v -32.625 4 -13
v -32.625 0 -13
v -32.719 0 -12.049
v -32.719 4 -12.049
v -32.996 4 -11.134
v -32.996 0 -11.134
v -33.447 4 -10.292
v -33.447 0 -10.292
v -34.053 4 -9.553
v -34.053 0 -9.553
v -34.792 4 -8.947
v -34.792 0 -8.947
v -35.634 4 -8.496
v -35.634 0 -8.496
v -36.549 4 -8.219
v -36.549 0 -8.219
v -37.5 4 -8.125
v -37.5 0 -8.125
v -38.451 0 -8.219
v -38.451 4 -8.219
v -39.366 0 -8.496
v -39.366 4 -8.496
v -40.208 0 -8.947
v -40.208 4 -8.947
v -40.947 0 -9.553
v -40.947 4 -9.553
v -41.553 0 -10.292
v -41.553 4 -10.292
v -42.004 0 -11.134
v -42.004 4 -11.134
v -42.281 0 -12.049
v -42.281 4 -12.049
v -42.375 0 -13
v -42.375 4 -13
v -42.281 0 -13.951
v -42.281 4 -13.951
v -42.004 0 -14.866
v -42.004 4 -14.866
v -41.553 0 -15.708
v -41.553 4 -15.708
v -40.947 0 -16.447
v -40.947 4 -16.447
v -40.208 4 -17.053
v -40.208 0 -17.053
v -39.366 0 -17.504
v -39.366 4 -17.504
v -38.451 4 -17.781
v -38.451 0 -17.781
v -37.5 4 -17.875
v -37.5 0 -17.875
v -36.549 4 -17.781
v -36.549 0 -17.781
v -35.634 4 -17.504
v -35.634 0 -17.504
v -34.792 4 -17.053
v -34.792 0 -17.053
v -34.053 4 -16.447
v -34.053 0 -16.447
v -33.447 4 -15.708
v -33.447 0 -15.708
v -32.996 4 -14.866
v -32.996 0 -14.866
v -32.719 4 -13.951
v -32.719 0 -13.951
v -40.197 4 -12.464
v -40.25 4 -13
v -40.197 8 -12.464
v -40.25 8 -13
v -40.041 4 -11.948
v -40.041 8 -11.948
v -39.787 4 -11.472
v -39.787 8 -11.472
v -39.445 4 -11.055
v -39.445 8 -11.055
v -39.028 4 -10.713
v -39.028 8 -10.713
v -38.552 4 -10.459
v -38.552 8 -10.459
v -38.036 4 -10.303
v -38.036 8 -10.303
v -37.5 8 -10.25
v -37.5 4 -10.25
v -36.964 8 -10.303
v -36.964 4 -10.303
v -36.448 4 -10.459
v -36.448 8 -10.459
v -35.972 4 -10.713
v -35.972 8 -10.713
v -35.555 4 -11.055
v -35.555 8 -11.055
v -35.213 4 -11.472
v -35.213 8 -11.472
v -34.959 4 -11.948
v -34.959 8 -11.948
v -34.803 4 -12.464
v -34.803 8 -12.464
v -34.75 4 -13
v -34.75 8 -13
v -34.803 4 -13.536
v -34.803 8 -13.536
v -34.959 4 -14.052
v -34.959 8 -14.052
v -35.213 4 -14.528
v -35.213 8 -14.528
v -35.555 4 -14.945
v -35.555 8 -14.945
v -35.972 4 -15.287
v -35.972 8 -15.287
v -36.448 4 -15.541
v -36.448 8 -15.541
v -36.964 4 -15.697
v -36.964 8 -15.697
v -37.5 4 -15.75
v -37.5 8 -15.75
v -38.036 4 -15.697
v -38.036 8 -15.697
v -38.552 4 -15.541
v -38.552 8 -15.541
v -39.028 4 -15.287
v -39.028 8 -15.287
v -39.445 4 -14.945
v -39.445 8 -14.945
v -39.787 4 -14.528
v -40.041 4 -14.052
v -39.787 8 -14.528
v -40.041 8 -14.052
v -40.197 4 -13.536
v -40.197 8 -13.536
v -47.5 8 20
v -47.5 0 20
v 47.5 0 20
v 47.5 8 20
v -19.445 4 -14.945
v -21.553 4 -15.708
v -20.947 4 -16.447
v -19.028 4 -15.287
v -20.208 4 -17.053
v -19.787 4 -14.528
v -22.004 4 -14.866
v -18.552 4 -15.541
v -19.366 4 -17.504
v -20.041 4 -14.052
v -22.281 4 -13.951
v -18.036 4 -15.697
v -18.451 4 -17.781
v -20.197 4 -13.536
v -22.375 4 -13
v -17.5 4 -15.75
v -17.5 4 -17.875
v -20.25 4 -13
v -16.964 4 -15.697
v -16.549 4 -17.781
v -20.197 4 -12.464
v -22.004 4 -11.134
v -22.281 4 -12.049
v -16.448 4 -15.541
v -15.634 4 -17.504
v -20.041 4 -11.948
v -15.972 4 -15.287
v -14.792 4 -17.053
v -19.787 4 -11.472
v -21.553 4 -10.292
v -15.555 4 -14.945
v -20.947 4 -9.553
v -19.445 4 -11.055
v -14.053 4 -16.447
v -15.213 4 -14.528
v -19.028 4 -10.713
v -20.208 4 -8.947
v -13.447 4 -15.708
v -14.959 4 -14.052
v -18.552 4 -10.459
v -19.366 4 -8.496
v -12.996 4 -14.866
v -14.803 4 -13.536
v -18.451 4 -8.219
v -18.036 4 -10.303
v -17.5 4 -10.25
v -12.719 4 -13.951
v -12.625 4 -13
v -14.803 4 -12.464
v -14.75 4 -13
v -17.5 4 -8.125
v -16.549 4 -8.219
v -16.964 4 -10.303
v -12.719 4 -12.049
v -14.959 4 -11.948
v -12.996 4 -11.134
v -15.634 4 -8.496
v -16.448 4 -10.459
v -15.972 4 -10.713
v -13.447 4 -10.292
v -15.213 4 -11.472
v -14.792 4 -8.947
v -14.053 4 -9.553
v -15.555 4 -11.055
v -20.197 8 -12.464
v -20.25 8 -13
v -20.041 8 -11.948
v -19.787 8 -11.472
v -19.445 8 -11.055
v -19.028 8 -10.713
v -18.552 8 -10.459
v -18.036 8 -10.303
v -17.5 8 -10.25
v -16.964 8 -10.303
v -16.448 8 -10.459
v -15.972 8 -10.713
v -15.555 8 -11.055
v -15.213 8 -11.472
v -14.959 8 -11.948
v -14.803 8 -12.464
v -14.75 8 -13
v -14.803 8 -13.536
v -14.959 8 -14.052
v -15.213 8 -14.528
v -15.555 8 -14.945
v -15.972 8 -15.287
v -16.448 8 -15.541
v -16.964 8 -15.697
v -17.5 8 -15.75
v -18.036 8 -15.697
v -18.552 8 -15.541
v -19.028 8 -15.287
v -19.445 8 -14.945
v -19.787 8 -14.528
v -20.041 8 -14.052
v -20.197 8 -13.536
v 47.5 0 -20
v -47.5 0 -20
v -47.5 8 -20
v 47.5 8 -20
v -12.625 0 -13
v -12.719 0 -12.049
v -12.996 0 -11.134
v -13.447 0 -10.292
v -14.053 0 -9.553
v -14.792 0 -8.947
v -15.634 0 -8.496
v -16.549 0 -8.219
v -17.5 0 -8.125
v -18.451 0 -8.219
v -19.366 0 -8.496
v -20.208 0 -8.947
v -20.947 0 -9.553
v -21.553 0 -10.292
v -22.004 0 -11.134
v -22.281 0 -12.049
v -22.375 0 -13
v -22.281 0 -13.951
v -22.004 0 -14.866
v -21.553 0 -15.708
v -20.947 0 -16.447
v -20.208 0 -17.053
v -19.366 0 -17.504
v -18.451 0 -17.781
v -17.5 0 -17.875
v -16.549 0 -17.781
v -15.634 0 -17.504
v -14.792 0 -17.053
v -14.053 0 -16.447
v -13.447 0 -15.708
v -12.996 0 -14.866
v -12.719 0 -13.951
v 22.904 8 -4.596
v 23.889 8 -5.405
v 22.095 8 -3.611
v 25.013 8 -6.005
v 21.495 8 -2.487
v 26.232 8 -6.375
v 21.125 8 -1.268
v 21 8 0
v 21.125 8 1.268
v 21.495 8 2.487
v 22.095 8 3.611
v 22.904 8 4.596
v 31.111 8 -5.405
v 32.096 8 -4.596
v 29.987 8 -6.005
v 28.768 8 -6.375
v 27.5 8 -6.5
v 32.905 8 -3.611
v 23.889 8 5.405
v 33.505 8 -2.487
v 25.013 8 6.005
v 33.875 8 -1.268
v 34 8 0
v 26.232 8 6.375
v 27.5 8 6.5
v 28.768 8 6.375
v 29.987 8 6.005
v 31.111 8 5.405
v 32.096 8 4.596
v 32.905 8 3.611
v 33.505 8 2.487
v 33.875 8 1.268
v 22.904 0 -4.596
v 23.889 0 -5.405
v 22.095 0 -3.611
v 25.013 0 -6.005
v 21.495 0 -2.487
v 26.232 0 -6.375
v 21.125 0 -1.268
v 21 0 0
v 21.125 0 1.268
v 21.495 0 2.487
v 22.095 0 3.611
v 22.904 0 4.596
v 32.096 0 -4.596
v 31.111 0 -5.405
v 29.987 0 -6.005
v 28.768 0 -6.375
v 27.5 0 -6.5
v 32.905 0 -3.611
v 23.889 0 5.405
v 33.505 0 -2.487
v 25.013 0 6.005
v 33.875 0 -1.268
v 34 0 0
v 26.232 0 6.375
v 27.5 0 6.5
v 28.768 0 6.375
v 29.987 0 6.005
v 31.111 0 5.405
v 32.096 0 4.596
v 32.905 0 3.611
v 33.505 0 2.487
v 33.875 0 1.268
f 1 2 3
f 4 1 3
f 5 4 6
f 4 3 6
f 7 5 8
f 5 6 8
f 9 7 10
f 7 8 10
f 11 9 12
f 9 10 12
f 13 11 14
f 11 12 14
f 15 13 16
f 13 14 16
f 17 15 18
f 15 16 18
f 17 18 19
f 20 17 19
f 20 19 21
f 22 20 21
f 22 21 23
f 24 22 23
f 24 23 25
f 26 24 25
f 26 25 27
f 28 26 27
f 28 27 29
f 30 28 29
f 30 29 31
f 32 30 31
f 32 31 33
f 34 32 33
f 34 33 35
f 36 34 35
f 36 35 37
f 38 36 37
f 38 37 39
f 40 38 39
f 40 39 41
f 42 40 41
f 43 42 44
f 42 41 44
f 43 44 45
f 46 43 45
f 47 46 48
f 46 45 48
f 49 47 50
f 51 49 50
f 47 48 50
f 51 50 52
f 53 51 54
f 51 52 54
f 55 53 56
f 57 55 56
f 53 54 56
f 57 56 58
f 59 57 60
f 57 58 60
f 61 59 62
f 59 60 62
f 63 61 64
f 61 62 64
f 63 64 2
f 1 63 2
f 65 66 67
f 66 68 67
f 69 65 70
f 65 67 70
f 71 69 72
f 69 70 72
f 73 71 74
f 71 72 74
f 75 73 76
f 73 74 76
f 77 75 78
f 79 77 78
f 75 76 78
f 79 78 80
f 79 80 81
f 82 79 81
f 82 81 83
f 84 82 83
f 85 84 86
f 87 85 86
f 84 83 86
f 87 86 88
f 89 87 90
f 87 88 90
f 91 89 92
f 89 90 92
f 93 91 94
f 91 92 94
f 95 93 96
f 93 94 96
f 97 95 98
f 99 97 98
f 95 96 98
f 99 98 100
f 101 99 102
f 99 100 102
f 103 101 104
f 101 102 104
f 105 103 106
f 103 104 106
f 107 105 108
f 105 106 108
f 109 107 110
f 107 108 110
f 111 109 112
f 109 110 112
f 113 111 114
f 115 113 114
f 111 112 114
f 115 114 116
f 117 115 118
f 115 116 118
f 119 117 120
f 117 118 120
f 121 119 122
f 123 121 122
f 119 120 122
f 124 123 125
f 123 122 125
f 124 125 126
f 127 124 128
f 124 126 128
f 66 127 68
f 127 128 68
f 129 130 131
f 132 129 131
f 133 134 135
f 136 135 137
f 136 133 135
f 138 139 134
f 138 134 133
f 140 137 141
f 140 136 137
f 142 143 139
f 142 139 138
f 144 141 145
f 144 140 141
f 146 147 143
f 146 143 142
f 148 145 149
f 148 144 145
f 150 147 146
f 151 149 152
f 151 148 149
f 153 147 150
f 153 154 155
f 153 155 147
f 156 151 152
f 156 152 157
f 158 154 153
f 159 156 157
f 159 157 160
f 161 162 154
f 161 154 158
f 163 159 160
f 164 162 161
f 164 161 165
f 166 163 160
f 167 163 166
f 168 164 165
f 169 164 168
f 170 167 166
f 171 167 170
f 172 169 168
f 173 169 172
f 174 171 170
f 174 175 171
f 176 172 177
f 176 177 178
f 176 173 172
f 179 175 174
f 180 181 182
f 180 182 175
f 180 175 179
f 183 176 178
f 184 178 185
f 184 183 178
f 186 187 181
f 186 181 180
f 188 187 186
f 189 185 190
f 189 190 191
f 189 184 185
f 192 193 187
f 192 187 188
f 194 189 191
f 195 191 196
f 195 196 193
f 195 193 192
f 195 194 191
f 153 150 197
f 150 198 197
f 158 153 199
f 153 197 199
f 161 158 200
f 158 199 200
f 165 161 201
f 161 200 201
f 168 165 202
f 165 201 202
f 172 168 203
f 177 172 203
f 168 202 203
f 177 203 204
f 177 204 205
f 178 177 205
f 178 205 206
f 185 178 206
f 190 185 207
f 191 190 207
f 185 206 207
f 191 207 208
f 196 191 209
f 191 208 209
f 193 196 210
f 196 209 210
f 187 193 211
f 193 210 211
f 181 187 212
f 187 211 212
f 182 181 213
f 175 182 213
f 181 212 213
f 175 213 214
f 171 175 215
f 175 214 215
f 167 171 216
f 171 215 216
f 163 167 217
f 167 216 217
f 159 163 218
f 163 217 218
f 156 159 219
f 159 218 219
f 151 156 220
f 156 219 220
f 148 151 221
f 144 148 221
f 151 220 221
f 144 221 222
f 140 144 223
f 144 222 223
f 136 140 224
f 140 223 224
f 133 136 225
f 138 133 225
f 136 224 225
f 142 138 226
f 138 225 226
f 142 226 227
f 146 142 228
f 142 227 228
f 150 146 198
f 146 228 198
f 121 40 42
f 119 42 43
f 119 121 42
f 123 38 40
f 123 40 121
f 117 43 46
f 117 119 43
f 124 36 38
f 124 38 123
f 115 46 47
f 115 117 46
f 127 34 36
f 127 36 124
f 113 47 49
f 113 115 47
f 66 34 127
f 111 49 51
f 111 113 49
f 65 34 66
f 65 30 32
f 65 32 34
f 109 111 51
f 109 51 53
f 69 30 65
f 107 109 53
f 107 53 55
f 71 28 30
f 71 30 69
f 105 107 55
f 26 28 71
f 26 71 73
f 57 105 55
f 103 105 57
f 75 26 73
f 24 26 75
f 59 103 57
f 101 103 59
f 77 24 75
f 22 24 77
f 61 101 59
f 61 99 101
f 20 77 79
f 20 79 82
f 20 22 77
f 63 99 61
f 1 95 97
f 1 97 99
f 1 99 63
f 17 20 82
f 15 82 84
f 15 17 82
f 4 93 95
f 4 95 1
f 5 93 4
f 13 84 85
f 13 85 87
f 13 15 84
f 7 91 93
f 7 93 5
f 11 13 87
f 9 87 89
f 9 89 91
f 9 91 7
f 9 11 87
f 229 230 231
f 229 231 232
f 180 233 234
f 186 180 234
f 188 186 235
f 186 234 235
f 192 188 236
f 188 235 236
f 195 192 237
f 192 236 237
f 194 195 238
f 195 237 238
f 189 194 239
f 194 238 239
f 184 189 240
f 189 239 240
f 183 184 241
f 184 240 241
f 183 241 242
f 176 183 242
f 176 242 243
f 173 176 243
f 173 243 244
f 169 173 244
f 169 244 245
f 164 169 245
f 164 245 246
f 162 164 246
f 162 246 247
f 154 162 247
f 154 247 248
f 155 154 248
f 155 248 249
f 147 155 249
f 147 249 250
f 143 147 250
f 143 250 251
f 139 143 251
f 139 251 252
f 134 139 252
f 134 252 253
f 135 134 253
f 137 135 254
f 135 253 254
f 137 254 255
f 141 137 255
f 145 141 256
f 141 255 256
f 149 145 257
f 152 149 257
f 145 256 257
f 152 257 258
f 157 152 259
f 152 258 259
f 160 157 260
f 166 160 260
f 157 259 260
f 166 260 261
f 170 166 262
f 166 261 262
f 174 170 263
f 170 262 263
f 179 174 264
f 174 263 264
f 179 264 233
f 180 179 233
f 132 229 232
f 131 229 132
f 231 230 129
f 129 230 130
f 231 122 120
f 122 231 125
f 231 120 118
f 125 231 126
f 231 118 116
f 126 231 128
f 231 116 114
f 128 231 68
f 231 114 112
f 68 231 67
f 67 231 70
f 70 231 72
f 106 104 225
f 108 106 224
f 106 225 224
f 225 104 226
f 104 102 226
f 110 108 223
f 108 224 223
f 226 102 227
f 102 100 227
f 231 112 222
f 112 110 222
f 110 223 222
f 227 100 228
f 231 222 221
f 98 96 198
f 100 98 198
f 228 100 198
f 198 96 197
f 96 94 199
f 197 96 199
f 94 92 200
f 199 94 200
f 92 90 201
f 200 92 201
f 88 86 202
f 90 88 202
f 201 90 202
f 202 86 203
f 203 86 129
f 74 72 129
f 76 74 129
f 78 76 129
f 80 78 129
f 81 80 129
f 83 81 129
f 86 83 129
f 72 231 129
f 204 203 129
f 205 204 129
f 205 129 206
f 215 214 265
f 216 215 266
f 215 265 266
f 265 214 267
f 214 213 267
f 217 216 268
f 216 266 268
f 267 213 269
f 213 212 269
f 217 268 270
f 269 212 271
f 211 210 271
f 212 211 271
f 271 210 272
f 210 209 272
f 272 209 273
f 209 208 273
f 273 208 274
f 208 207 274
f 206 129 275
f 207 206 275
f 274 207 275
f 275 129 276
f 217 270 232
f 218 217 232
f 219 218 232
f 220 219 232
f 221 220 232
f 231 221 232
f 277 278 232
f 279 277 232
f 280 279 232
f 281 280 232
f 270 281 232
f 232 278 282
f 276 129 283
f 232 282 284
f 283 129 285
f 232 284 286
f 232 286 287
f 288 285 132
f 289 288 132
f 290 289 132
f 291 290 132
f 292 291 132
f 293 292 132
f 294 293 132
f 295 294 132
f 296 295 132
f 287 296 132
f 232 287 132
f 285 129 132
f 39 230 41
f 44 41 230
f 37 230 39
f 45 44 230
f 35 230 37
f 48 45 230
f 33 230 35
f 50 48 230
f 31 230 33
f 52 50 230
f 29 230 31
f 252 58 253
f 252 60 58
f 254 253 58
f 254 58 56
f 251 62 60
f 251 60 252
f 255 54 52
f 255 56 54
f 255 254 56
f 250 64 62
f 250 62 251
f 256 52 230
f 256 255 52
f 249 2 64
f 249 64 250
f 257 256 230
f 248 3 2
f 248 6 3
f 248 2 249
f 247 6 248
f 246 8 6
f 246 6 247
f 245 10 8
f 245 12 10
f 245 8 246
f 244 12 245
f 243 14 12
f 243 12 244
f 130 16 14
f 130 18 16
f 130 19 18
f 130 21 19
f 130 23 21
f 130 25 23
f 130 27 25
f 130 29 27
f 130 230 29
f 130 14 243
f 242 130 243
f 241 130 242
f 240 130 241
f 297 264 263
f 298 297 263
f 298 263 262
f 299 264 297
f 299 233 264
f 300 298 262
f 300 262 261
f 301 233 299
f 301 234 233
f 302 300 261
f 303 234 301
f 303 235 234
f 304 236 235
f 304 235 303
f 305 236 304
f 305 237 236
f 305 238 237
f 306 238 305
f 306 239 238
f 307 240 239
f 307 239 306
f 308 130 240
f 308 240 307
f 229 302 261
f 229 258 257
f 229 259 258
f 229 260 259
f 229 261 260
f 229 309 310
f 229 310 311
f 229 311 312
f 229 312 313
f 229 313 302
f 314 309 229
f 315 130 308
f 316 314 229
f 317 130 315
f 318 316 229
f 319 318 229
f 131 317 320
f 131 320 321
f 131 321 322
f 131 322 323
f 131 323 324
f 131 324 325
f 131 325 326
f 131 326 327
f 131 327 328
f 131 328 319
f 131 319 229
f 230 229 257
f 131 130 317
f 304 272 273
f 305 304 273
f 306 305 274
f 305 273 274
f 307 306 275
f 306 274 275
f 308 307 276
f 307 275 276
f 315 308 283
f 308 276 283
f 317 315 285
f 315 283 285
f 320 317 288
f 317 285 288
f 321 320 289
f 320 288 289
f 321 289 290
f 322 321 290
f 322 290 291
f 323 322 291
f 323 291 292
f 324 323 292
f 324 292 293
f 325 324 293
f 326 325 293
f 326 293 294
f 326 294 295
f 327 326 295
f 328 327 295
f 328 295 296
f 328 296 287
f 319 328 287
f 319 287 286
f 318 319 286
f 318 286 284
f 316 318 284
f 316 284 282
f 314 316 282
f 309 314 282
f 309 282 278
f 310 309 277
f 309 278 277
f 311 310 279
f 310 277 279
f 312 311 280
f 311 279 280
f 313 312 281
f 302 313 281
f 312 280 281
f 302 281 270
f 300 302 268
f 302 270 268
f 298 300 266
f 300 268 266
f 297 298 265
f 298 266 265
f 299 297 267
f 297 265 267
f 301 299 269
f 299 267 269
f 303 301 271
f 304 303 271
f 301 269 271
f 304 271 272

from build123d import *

# Parameters (mm, degrees)
F0_W           = 95
F0_H           = 40
F1_DEPTH       = 8
F2_D           = 5.5
F2_CBORE_D     = 9.75
F2_CBORE_DEPTH = 4
F3_D           = 13


with BuildPart() as f1:
    # F0 (on Front) → F1 (new body)
    with BuildSketch(Plane.XZ):
        Rectangle(F0_W, F0_H)
    extrude(amount=-F1_DEPTH)

    # F2 (through all)
    with Locations(Plane.XZ):
        with Locations((-17.5, -13), (-37.5, -13)):
            CounterBoreHole(F2_D / 2, F2_CBORE_D / 2, F2_CBORE_DEPTH)

    # F3 (through all)
    with Locations(Plane.XZ):
        with Locations((27.5, 0)):
            Hole(F3_D / 2)


solid = f1.part
